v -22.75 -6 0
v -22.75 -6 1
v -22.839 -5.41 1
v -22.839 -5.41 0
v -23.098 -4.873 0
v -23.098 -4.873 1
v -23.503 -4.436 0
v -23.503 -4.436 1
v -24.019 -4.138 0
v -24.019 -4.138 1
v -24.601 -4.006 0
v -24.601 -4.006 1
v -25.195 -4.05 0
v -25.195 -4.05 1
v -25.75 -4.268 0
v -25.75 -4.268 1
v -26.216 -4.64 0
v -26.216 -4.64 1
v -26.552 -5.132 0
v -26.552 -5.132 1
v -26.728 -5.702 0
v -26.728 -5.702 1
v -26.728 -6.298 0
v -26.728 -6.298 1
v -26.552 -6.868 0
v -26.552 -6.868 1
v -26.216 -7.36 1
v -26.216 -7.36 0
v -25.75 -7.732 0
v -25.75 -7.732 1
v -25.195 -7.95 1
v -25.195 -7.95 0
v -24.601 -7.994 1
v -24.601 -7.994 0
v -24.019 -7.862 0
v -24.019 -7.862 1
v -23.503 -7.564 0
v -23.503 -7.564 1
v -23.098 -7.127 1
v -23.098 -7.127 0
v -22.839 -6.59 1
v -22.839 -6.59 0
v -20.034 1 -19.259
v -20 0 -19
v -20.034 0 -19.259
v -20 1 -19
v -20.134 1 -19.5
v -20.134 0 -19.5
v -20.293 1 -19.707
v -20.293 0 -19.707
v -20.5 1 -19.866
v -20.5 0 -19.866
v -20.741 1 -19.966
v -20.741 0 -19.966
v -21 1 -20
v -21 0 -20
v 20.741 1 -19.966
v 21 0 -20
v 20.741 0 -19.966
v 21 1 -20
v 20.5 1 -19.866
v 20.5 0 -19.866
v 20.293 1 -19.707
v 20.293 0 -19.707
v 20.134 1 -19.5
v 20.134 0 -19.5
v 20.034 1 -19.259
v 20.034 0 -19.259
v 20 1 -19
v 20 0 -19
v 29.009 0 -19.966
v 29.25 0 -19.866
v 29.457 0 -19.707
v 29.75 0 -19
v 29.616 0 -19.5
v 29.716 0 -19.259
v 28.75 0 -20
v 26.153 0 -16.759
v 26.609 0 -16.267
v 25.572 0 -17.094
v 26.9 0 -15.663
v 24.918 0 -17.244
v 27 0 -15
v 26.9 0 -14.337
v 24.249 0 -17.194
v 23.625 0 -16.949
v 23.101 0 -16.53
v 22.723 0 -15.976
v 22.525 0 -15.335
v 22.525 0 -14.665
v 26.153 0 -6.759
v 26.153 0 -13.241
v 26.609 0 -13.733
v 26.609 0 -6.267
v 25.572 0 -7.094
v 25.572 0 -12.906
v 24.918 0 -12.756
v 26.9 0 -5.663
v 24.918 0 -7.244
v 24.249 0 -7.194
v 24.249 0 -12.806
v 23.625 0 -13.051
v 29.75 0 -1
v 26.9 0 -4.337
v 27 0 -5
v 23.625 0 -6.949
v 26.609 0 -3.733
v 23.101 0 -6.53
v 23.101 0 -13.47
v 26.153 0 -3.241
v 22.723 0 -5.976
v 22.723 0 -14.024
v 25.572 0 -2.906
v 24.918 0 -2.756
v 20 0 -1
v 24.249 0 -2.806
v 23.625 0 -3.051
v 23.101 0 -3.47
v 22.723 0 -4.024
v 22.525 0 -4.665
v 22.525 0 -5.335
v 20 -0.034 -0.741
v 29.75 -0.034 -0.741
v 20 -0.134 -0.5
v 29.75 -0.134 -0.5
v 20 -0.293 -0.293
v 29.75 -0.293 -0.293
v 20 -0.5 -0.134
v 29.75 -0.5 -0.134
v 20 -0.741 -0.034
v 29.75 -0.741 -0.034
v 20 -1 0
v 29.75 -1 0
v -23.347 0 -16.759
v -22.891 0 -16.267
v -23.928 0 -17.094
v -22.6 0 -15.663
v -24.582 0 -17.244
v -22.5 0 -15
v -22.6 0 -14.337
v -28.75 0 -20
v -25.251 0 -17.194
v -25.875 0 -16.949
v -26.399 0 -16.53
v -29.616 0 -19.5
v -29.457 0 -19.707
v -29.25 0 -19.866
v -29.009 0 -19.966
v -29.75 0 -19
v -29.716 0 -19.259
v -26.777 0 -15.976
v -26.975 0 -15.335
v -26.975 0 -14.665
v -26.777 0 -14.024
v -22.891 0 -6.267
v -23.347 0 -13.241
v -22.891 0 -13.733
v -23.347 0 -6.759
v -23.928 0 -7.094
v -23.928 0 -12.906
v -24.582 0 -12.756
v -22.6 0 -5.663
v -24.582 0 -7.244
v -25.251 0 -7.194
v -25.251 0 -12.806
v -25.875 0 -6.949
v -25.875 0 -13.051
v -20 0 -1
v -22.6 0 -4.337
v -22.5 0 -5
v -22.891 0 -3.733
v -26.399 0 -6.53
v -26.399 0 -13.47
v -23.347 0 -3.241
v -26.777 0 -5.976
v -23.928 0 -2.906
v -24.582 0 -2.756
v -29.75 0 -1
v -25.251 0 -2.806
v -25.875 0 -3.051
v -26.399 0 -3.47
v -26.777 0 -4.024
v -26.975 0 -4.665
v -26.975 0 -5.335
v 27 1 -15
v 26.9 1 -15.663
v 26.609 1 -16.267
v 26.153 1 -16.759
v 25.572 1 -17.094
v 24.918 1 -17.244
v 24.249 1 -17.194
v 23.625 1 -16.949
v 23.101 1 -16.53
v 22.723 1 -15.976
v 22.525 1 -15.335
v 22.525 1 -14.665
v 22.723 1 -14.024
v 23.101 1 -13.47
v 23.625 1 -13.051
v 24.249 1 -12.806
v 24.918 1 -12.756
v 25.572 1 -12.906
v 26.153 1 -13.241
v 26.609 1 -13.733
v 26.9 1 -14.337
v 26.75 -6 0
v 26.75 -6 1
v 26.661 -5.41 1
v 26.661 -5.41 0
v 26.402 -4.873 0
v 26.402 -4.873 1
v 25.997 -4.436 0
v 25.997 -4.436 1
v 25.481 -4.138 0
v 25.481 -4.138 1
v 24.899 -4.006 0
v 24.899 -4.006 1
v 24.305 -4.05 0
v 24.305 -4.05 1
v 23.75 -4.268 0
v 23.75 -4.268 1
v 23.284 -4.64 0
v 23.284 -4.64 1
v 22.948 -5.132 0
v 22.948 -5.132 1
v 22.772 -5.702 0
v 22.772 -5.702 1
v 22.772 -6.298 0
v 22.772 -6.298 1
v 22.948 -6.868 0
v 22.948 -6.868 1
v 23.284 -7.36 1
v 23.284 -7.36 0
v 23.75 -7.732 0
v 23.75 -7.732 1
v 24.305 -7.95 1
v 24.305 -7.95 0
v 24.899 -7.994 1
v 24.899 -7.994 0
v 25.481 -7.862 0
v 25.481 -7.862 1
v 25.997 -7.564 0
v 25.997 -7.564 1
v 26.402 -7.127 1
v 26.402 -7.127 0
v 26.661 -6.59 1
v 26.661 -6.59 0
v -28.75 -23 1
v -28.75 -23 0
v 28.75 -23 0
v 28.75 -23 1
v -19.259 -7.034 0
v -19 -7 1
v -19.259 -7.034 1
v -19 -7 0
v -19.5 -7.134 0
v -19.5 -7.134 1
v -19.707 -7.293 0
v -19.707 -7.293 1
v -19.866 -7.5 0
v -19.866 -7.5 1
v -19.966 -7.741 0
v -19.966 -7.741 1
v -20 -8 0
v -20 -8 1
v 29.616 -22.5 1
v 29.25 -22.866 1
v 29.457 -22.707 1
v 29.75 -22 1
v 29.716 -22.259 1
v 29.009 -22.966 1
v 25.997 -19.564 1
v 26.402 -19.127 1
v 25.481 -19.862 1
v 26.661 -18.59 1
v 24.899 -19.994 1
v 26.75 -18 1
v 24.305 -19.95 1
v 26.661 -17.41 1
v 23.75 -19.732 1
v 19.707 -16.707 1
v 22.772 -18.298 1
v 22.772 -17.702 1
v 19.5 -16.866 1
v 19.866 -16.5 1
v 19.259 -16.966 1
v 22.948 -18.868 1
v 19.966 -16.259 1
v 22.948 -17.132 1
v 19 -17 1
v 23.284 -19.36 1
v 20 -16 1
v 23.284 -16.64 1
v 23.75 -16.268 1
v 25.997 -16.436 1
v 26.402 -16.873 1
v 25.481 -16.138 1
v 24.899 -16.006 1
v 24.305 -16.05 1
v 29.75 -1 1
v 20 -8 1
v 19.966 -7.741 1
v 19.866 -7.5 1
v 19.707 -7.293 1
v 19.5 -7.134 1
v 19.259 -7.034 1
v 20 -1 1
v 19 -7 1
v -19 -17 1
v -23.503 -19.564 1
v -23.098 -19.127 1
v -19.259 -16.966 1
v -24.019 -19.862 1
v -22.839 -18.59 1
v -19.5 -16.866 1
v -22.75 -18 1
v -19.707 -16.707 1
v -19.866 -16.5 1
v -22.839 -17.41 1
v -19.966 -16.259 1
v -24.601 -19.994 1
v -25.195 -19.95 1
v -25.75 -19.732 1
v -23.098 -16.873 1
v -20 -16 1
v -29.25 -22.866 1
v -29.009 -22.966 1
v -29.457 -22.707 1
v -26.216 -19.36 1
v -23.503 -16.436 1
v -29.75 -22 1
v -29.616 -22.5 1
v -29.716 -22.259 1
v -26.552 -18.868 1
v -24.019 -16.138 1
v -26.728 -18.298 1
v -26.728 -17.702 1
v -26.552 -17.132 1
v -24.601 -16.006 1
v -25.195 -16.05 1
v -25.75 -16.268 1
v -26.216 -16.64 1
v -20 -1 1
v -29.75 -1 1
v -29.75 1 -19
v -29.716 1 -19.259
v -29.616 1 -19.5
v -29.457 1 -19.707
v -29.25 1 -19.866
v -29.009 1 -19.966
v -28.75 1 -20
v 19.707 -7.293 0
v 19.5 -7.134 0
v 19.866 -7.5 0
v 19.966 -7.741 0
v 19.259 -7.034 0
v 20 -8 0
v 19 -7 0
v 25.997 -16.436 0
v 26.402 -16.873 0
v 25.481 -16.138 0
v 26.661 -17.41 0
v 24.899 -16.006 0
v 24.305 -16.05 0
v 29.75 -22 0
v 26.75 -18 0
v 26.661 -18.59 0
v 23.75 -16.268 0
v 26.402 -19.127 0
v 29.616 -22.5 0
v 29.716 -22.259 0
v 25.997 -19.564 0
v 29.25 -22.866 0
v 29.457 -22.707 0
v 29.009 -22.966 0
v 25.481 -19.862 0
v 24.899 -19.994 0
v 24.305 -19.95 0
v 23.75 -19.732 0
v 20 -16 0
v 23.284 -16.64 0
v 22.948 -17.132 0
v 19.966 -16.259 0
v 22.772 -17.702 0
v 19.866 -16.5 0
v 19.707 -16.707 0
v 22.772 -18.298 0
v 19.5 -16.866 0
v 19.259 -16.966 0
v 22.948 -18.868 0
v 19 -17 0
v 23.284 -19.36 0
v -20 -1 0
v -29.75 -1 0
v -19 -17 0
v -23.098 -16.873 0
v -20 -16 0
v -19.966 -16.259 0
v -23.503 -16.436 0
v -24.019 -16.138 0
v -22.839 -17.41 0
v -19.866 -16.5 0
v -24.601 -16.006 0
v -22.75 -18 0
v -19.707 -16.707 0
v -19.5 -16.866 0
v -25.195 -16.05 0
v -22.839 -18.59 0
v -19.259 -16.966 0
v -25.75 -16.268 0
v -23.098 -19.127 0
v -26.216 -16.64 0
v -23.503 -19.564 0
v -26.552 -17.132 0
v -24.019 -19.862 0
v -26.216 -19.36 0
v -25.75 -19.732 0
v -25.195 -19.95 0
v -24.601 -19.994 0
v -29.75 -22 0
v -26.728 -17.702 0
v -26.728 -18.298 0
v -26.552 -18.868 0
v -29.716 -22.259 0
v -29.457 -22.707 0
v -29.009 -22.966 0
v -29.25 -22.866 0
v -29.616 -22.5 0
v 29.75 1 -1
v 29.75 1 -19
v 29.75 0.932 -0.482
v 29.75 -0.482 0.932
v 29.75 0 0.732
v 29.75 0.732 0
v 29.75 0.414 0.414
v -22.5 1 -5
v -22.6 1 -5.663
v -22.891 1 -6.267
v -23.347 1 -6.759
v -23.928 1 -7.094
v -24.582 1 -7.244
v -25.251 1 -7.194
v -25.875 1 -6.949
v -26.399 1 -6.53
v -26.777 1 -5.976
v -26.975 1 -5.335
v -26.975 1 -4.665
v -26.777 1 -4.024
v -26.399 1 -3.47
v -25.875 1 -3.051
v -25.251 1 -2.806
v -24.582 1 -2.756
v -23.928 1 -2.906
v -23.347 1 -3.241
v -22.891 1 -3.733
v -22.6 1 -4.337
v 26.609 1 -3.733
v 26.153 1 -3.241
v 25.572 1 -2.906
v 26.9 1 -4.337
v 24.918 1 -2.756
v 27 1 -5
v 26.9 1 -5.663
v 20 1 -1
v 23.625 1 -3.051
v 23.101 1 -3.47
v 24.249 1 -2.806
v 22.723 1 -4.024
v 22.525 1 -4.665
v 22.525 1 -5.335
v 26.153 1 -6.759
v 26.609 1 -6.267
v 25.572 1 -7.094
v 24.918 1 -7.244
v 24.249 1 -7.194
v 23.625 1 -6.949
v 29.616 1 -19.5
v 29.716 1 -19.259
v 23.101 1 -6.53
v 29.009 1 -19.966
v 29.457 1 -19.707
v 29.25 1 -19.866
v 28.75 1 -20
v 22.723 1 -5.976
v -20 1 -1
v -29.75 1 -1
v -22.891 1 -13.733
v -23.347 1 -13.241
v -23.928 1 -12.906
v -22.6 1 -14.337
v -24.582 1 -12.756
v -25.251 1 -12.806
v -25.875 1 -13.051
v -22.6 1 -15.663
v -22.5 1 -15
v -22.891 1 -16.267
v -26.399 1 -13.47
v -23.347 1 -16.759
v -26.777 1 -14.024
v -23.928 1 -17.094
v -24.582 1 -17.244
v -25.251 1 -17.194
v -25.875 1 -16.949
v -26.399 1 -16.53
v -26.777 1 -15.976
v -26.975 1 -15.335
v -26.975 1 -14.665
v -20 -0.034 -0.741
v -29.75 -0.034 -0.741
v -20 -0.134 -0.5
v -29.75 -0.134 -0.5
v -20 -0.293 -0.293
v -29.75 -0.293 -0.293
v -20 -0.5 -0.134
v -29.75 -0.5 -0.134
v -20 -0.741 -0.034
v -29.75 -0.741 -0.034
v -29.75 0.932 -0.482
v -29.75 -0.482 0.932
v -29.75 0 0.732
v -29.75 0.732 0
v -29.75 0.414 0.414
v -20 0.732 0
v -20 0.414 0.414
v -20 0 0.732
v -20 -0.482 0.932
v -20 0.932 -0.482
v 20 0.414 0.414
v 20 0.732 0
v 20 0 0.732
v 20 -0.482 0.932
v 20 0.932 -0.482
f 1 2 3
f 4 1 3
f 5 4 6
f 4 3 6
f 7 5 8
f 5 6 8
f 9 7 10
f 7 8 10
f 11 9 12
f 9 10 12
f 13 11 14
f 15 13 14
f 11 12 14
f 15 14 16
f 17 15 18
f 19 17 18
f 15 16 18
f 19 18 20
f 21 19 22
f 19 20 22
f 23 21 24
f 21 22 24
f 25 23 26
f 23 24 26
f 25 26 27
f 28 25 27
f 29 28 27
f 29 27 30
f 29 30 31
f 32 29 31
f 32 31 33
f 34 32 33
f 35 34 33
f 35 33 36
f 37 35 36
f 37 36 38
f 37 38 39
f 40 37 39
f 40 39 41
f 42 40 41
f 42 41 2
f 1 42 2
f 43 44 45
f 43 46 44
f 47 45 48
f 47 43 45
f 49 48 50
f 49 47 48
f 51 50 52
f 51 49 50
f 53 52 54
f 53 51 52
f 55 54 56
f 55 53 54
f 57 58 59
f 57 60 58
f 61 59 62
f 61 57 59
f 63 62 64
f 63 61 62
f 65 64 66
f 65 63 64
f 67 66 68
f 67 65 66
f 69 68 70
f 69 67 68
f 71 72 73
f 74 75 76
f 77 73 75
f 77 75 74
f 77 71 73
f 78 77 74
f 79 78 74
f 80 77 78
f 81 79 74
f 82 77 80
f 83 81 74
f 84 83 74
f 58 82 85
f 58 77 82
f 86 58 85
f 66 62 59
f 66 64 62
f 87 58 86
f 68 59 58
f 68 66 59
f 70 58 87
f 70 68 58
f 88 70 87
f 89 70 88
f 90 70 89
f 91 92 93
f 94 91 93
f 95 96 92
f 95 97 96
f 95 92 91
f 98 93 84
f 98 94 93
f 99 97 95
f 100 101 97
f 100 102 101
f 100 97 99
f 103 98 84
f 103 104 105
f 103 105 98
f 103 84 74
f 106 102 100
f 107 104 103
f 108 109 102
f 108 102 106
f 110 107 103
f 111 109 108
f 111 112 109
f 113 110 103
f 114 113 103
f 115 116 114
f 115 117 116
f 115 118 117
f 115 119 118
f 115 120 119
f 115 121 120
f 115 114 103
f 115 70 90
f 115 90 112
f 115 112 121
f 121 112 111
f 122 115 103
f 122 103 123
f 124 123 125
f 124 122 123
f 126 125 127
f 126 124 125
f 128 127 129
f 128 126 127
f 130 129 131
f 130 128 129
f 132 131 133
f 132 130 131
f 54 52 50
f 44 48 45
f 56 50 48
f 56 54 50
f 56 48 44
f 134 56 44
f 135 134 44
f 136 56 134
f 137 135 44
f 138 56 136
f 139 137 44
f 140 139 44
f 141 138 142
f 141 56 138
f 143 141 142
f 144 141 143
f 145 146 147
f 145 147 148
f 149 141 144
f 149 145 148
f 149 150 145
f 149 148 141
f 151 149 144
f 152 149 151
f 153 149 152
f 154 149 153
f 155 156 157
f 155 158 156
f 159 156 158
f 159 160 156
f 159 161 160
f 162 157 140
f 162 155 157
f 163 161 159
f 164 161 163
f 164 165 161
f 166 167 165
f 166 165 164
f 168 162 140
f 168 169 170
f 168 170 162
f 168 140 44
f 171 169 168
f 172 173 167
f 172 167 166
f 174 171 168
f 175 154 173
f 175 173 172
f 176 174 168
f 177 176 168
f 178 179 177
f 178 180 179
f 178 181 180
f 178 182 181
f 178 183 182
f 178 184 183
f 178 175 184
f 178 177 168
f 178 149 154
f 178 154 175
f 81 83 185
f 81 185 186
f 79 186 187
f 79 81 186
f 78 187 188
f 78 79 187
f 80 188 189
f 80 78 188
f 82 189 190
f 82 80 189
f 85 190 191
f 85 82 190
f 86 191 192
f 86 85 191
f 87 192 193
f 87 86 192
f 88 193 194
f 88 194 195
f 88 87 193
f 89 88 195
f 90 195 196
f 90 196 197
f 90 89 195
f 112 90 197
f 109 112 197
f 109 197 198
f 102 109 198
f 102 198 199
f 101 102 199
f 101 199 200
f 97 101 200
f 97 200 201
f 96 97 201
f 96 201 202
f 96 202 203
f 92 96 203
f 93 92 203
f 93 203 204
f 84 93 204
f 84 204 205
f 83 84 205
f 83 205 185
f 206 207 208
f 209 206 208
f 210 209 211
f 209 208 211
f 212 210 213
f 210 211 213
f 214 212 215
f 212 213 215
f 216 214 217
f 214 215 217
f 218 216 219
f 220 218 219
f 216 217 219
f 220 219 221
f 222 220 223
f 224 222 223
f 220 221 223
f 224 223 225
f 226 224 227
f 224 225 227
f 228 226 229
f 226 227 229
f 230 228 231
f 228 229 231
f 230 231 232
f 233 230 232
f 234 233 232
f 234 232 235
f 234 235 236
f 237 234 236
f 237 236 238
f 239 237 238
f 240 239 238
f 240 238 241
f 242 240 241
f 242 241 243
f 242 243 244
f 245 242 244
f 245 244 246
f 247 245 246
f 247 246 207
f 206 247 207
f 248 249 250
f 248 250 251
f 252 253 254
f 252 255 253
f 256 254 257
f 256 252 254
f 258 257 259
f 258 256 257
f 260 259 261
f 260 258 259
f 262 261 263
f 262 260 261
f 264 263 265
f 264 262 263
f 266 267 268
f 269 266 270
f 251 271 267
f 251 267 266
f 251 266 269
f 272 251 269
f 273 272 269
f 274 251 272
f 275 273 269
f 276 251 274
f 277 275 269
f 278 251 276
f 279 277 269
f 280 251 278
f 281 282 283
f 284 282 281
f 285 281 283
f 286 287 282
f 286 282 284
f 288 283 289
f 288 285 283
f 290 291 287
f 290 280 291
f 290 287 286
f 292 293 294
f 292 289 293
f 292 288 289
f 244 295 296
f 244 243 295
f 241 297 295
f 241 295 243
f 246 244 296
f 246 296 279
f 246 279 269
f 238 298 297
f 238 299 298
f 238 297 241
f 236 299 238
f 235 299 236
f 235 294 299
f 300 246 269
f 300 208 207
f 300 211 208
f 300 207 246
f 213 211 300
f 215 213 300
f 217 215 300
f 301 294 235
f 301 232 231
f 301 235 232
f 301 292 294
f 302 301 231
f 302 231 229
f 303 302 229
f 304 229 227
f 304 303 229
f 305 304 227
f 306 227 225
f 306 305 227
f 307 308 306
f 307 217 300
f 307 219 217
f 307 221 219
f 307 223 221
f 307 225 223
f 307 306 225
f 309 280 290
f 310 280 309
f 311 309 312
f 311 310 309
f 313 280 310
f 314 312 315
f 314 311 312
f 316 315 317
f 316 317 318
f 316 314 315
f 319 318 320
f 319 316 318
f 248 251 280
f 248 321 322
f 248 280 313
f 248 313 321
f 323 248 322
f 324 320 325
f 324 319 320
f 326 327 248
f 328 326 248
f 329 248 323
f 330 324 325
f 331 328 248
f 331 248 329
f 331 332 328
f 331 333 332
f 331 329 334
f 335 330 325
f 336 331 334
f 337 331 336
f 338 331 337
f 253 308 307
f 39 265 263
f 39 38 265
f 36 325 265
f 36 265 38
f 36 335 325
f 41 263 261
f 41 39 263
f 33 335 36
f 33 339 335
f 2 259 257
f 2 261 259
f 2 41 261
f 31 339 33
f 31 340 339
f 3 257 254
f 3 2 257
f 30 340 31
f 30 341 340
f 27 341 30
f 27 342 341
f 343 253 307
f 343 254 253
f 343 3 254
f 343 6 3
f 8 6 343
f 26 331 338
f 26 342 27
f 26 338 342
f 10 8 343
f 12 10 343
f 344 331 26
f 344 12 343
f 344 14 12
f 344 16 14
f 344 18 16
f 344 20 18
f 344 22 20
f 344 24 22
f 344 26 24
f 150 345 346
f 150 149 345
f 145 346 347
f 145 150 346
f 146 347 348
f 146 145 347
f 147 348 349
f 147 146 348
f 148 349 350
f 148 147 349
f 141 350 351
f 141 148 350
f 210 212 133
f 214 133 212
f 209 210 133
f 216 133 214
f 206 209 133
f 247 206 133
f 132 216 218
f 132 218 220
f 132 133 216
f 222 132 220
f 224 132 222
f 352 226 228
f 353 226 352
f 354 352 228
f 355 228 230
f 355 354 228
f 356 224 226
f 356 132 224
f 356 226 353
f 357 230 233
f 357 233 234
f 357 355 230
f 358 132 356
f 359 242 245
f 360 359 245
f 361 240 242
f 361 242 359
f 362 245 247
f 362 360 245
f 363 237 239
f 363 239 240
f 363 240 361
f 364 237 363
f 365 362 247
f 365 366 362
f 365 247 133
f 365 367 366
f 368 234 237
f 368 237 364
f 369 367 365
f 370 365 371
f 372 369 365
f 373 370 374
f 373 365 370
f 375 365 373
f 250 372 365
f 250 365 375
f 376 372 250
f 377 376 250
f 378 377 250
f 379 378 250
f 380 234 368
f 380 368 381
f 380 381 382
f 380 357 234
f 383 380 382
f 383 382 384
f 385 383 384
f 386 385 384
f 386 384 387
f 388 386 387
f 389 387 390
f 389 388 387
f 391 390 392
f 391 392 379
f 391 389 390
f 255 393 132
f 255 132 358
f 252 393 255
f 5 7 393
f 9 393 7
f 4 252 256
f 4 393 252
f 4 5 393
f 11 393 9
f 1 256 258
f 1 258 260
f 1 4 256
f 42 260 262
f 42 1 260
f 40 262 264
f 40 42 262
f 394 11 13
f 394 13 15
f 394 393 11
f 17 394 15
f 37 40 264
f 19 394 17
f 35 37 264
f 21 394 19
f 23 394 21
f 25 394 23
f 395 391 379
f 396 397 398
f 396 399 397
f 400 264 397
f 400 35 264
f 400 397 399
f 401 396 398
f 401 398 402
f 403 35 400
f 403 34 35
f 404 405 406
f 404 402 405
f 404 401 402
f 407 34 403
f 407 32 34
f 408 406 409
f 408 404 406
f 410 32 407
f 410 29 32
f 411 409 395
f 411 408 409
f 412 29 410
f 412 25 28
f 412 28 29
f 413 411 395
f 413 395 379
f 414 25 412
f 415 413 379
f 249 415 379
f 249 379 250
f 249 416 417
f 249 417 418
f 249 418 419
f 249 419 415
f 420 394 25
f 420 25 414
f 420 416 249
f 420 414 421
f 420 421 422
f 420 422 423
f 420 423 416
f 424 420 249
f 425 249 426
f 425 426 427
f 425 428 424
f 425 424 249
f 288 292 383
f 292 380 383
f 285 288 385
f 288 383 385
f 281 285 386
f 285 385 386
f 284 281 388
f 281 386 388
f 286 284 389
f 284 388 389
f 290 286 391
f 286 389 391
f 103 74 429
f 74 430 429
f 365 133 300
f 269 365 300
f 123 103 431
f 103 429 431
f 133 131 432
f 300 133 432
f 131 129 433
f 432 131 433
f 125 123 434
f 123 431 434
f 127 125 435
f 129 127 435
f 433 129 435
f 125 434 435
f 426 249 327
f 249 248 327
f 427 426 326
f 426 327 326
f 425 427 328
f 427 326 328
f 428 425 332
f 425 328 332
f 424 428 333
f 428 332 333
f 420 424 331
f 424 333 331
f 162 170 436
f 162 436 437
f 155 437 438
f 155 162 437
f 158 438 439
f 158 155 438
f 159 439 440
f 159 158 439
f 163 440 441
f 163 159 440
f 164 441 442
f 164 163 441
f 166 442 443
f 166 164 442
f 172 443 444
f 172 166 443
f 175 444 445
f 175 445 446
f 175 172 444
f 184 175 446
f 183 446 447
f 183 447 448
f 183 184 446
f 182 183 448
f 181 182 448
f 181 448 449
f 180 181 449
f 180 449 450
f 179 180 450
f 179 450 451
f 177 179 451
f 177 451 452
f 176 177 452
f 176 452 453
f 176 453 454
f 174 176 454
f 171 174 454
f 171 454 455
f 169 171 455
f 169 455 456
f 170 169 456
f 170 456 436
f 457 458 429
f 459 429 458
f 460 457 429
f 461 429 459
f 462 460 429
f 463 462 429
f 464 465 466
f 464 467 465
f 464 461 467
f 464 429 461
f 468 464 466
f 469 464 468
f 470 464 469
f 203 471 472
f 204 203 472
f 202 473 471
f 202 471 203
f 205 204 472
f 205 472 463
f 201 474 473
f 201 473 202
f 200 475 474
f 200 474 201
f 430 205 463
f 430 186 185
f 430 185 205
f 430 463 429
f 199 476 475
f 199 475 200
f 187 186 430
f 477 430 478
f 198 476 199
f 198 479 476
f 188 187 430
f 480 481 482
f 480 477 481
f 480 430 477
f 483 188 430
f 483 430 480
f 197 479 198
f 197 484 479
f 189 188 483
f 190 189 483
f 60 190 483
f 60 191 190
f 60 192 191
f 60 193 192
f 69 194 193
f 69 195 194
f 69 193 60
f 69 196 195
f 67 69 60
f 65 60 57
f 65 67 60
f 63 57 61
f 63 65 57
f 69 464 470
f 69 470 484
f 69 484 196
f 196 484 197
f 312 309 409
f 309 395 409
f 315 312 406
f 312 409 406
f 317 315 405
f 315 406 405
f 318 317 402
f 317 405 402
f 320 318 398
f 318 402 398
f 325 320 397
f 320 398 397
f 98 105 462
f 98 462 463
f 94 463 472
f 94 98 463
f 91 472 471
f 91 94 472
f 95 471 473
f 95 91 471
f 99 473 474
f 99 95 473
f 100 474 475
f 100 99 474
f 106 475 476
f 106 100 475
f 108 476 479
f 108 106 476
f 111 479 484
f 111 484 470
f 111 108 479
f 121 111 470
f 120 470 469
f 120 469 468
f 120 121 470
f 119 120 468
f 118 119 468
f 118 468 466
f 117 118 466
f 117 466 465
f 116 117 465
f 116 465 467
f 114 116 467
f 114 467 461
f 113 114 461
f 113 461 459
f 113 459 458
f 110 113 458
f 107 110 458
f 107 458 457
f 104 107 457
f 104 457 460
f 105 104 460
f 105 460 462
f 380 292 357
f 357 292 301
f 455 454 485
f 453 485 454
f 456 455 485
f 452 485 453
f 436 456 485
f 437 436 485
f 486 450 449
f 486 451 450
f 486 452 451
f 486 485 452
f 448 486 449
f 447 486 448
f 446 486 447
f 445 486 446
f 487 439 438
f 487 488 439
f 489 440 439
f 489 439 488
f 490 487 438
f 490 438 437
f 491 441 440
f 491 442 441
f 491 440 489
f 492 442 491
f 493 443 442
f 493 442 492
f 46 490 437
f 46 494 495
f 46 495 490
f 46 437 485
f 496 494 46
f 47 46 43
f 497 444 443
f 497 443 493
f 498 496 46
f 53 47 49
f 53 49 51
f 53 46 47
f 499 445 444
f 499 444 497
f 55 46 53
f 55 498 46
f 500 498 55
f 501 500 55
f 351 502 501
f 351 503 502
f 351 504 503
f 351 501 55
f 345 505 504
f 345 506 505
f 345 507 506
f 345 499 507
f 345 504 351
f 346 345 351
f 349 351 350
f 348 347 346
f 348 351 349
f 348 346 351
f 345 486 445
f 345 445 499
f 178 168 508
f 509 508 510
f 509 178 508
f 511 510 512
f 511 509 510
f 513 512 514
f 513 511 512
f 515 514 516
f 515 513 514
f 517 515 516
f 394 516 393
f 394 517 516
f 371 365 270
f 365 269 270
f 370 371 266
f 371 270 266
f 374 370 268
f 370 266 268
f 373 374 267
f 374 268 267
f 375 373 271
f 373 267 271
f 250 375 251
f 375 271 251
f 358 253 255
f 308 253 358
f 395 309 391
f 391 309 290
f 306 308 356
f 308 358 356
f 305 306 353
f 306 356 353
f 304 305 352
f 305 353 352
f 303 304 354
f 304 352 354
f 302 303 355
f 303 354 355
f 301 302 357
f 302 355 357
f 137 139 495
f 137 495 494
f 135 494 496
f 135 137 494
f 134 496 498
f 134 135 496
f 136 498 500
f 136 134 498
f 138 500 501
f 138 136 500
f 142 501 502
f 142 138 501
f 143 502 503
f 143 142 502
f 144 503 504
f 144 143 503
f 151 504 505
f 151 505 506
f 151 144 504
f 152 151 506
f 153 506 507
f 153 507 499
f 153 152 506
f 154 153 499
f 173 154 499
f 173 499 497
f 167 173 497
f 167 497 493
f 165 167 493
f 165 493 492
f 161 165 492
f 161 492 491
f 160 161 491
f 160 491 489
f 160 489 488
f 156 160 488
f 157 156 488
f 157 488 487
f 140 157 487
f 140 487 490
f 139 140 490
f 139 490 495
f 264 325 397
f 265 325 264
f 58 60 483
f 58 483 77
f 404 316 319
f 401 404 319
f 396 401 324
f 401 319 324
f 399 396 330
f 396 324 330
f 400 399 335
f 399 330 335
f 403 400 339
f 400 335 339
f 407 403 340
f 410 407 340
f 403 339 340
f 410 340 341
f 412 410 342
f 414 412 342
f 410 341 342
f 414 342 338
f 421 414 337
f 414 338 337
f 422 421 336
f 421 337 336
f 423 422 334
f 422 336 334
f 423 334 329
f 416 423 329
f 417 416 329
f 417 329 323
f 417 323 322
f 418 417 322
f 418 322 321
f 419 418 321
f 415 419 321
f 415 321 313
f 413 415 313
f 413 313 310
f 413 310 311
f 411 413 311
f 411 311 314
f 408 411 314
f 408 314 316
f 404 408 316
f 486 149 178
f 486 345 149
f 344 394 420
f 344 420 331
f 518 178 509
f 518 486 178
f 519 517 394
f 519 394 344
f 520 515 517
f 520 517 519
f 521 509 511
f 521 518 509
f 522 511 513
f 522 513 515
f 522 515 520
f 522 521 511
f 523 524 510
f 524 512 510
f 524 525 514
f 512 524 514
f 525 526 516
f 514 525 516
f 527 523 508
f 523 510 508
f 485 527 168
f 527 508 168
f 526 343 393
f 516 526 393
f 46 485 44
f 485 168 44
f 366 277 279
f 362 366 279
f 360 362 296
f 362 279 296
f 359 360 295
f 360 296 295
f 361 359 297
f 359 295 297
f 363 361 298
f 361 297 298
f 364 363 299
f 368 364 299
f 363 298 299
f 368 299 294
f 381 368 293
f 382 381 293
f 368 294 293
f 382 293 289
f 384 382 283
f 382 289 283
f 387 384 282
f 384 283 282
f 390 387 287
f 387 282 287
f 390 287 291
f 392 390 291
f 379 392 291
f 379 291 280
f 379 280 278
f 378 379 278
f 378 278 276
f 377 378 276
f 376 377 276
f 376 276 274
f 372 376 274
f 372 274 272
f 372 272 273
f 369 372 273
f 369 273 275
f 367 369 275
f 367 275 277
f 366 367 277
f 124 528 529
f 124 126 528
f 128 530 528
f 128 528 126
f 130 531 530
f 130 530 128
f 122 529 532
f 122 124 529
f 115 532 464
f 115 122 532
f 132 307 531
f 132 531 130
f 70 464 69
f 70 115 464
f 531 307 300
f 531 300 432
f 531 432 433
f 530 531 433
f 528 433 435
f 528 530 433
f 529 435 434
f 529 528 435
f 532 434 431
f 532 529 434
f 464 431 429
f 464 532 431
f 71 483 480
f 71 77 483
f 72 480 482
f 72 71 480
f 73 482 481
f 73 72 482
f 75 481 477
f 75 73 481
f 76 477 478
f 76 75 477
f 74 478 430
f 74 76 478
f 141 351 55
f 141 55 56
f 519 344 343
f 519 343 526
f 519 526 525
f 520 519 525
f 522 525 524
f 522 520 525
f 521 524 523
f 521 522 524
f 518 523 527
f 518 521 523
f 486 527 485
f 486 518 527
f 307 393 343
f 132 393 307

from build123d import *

# Parameters (mm, degrees)
SM_BASE_FLANGE_1_DEPTH  = 29.75
CUT_EXTRUDE_START       = -2
CUT_EXTRUDE_1_OUTLINE_W = 40
CUT_EXTRUDE_1_OUTLINE_H = 22
CUT_EXTRUDE_1_OUTLINE_R = 2.25
CUT_EXTRUDE_1_DEPTH     = 2
SKETCH_7_R              = 2
SKETCH_7_W              = 40
SKETCH_7_H              = 10
CUT_EXTRUDE_4_DEPTH     = 44.070436497
FILLET_1_R              = 1


# Read off the part's stored shape, not the designer's step: 切除-拉伸1
# Sheet-metal steps are written as plain solids
with BuildPart() as part:
    # Sketch 1 → 基体-法兰1 (new, symmetric)
    with BuildSketch(Plane.ZY):
        with BuildLine():
            Line((-20, 0), (-1, 0))
            ThreePointArc((-1, 0), (-0.292893219, -0.292893219), (0, -1))
            Line((0, -1), (0, -23))
            Line((0, -23), (1, -23))
            Line((1, -23), (1, -1))
            ThreePointArc((1, -1), (0.414213562, 0.414213562), (-1, 1))
            Line((-1, 1), (-20, 1))
            Line((-20, 1), (-20, 0))
        make_face()
    extrude(amount=SM_BASE_FLANGE_1_DEPTH, both=True)

    # 切除-拉伸1 outline → 切除-拉伸1 (cut)
    with BuildSketch(Plane(origin=(0, 1, 0), x_dir=(1, 0, 0), z_dir=(0, 1, 0)).offset(CUT_EXTRUDE_START)):
        with Locations((0, 9)):
            Rectangle(CUT_EXTRUDE_1_OUTLINE_W, CUT_EXTRUDE_1_OUTLINE_H)
        with Locations((-24.75, 15)):
            Circle(CUT_EXTRUDE_1_OUTLINE_R)
        with Locations((24.75, 15)):
            Circle(CUT_EXTRUDE_1_OUTLINE_R)
        with Locations((24.75, 5)):
            Circle(CUT_EXTRUDE_1_OUTLINE_R)
        with Locations((-24.75, 5)):
            Circle(CUT_EXTRUDE_1_OUTLINE_R)
    extrude(amount=CUT_EXTRUDE_1_DEPTH, mode=Mode.SUBTRACT)

    # 草图7 → 切除-拉伸4 (cut, through all)
    with BuildSketch(Plane.XY.offset(1)):
        with Locations((-24.75, -6)):
            Circle(SKETCH_7_R)
        with Locations((-24.75, -18)):
            Circle(SKETCH_7_R)
        with Locations((24.75, -18)):
            Circle(SKETCH_7_R)
        with Locations((24.75, -6)):
            Circle(SKETCH_7_R)
        with Locations((0, -12)):
            Rectangle(SKETCH_7_W, SKETCH_7_H)
    extrude(amount=-CUT_EXTRUDE_4_DEPTH, mode=Mode.SUBTRACT)

    # 圆角1
    fillet_1_edges = [part.edges().sort_by_distance(p)[0] for p in [
        (-20, -17, 0.5),
        (-20, -7, 0.5),
        (20, -7, 0.5),
        (20, -17, 0.5),
        (-29.75, 0.5, -20),
        (20, 0.5, -20),
        (-20, 0.5, -20),
        (-29.75, -23, 0.5),
        (29.75, 0.5, -20),
        (29.75, -23, 0.5),
    ]]
    fillet(fillet_1_edges, radius=FILLET_1_R)


solid = part.part
